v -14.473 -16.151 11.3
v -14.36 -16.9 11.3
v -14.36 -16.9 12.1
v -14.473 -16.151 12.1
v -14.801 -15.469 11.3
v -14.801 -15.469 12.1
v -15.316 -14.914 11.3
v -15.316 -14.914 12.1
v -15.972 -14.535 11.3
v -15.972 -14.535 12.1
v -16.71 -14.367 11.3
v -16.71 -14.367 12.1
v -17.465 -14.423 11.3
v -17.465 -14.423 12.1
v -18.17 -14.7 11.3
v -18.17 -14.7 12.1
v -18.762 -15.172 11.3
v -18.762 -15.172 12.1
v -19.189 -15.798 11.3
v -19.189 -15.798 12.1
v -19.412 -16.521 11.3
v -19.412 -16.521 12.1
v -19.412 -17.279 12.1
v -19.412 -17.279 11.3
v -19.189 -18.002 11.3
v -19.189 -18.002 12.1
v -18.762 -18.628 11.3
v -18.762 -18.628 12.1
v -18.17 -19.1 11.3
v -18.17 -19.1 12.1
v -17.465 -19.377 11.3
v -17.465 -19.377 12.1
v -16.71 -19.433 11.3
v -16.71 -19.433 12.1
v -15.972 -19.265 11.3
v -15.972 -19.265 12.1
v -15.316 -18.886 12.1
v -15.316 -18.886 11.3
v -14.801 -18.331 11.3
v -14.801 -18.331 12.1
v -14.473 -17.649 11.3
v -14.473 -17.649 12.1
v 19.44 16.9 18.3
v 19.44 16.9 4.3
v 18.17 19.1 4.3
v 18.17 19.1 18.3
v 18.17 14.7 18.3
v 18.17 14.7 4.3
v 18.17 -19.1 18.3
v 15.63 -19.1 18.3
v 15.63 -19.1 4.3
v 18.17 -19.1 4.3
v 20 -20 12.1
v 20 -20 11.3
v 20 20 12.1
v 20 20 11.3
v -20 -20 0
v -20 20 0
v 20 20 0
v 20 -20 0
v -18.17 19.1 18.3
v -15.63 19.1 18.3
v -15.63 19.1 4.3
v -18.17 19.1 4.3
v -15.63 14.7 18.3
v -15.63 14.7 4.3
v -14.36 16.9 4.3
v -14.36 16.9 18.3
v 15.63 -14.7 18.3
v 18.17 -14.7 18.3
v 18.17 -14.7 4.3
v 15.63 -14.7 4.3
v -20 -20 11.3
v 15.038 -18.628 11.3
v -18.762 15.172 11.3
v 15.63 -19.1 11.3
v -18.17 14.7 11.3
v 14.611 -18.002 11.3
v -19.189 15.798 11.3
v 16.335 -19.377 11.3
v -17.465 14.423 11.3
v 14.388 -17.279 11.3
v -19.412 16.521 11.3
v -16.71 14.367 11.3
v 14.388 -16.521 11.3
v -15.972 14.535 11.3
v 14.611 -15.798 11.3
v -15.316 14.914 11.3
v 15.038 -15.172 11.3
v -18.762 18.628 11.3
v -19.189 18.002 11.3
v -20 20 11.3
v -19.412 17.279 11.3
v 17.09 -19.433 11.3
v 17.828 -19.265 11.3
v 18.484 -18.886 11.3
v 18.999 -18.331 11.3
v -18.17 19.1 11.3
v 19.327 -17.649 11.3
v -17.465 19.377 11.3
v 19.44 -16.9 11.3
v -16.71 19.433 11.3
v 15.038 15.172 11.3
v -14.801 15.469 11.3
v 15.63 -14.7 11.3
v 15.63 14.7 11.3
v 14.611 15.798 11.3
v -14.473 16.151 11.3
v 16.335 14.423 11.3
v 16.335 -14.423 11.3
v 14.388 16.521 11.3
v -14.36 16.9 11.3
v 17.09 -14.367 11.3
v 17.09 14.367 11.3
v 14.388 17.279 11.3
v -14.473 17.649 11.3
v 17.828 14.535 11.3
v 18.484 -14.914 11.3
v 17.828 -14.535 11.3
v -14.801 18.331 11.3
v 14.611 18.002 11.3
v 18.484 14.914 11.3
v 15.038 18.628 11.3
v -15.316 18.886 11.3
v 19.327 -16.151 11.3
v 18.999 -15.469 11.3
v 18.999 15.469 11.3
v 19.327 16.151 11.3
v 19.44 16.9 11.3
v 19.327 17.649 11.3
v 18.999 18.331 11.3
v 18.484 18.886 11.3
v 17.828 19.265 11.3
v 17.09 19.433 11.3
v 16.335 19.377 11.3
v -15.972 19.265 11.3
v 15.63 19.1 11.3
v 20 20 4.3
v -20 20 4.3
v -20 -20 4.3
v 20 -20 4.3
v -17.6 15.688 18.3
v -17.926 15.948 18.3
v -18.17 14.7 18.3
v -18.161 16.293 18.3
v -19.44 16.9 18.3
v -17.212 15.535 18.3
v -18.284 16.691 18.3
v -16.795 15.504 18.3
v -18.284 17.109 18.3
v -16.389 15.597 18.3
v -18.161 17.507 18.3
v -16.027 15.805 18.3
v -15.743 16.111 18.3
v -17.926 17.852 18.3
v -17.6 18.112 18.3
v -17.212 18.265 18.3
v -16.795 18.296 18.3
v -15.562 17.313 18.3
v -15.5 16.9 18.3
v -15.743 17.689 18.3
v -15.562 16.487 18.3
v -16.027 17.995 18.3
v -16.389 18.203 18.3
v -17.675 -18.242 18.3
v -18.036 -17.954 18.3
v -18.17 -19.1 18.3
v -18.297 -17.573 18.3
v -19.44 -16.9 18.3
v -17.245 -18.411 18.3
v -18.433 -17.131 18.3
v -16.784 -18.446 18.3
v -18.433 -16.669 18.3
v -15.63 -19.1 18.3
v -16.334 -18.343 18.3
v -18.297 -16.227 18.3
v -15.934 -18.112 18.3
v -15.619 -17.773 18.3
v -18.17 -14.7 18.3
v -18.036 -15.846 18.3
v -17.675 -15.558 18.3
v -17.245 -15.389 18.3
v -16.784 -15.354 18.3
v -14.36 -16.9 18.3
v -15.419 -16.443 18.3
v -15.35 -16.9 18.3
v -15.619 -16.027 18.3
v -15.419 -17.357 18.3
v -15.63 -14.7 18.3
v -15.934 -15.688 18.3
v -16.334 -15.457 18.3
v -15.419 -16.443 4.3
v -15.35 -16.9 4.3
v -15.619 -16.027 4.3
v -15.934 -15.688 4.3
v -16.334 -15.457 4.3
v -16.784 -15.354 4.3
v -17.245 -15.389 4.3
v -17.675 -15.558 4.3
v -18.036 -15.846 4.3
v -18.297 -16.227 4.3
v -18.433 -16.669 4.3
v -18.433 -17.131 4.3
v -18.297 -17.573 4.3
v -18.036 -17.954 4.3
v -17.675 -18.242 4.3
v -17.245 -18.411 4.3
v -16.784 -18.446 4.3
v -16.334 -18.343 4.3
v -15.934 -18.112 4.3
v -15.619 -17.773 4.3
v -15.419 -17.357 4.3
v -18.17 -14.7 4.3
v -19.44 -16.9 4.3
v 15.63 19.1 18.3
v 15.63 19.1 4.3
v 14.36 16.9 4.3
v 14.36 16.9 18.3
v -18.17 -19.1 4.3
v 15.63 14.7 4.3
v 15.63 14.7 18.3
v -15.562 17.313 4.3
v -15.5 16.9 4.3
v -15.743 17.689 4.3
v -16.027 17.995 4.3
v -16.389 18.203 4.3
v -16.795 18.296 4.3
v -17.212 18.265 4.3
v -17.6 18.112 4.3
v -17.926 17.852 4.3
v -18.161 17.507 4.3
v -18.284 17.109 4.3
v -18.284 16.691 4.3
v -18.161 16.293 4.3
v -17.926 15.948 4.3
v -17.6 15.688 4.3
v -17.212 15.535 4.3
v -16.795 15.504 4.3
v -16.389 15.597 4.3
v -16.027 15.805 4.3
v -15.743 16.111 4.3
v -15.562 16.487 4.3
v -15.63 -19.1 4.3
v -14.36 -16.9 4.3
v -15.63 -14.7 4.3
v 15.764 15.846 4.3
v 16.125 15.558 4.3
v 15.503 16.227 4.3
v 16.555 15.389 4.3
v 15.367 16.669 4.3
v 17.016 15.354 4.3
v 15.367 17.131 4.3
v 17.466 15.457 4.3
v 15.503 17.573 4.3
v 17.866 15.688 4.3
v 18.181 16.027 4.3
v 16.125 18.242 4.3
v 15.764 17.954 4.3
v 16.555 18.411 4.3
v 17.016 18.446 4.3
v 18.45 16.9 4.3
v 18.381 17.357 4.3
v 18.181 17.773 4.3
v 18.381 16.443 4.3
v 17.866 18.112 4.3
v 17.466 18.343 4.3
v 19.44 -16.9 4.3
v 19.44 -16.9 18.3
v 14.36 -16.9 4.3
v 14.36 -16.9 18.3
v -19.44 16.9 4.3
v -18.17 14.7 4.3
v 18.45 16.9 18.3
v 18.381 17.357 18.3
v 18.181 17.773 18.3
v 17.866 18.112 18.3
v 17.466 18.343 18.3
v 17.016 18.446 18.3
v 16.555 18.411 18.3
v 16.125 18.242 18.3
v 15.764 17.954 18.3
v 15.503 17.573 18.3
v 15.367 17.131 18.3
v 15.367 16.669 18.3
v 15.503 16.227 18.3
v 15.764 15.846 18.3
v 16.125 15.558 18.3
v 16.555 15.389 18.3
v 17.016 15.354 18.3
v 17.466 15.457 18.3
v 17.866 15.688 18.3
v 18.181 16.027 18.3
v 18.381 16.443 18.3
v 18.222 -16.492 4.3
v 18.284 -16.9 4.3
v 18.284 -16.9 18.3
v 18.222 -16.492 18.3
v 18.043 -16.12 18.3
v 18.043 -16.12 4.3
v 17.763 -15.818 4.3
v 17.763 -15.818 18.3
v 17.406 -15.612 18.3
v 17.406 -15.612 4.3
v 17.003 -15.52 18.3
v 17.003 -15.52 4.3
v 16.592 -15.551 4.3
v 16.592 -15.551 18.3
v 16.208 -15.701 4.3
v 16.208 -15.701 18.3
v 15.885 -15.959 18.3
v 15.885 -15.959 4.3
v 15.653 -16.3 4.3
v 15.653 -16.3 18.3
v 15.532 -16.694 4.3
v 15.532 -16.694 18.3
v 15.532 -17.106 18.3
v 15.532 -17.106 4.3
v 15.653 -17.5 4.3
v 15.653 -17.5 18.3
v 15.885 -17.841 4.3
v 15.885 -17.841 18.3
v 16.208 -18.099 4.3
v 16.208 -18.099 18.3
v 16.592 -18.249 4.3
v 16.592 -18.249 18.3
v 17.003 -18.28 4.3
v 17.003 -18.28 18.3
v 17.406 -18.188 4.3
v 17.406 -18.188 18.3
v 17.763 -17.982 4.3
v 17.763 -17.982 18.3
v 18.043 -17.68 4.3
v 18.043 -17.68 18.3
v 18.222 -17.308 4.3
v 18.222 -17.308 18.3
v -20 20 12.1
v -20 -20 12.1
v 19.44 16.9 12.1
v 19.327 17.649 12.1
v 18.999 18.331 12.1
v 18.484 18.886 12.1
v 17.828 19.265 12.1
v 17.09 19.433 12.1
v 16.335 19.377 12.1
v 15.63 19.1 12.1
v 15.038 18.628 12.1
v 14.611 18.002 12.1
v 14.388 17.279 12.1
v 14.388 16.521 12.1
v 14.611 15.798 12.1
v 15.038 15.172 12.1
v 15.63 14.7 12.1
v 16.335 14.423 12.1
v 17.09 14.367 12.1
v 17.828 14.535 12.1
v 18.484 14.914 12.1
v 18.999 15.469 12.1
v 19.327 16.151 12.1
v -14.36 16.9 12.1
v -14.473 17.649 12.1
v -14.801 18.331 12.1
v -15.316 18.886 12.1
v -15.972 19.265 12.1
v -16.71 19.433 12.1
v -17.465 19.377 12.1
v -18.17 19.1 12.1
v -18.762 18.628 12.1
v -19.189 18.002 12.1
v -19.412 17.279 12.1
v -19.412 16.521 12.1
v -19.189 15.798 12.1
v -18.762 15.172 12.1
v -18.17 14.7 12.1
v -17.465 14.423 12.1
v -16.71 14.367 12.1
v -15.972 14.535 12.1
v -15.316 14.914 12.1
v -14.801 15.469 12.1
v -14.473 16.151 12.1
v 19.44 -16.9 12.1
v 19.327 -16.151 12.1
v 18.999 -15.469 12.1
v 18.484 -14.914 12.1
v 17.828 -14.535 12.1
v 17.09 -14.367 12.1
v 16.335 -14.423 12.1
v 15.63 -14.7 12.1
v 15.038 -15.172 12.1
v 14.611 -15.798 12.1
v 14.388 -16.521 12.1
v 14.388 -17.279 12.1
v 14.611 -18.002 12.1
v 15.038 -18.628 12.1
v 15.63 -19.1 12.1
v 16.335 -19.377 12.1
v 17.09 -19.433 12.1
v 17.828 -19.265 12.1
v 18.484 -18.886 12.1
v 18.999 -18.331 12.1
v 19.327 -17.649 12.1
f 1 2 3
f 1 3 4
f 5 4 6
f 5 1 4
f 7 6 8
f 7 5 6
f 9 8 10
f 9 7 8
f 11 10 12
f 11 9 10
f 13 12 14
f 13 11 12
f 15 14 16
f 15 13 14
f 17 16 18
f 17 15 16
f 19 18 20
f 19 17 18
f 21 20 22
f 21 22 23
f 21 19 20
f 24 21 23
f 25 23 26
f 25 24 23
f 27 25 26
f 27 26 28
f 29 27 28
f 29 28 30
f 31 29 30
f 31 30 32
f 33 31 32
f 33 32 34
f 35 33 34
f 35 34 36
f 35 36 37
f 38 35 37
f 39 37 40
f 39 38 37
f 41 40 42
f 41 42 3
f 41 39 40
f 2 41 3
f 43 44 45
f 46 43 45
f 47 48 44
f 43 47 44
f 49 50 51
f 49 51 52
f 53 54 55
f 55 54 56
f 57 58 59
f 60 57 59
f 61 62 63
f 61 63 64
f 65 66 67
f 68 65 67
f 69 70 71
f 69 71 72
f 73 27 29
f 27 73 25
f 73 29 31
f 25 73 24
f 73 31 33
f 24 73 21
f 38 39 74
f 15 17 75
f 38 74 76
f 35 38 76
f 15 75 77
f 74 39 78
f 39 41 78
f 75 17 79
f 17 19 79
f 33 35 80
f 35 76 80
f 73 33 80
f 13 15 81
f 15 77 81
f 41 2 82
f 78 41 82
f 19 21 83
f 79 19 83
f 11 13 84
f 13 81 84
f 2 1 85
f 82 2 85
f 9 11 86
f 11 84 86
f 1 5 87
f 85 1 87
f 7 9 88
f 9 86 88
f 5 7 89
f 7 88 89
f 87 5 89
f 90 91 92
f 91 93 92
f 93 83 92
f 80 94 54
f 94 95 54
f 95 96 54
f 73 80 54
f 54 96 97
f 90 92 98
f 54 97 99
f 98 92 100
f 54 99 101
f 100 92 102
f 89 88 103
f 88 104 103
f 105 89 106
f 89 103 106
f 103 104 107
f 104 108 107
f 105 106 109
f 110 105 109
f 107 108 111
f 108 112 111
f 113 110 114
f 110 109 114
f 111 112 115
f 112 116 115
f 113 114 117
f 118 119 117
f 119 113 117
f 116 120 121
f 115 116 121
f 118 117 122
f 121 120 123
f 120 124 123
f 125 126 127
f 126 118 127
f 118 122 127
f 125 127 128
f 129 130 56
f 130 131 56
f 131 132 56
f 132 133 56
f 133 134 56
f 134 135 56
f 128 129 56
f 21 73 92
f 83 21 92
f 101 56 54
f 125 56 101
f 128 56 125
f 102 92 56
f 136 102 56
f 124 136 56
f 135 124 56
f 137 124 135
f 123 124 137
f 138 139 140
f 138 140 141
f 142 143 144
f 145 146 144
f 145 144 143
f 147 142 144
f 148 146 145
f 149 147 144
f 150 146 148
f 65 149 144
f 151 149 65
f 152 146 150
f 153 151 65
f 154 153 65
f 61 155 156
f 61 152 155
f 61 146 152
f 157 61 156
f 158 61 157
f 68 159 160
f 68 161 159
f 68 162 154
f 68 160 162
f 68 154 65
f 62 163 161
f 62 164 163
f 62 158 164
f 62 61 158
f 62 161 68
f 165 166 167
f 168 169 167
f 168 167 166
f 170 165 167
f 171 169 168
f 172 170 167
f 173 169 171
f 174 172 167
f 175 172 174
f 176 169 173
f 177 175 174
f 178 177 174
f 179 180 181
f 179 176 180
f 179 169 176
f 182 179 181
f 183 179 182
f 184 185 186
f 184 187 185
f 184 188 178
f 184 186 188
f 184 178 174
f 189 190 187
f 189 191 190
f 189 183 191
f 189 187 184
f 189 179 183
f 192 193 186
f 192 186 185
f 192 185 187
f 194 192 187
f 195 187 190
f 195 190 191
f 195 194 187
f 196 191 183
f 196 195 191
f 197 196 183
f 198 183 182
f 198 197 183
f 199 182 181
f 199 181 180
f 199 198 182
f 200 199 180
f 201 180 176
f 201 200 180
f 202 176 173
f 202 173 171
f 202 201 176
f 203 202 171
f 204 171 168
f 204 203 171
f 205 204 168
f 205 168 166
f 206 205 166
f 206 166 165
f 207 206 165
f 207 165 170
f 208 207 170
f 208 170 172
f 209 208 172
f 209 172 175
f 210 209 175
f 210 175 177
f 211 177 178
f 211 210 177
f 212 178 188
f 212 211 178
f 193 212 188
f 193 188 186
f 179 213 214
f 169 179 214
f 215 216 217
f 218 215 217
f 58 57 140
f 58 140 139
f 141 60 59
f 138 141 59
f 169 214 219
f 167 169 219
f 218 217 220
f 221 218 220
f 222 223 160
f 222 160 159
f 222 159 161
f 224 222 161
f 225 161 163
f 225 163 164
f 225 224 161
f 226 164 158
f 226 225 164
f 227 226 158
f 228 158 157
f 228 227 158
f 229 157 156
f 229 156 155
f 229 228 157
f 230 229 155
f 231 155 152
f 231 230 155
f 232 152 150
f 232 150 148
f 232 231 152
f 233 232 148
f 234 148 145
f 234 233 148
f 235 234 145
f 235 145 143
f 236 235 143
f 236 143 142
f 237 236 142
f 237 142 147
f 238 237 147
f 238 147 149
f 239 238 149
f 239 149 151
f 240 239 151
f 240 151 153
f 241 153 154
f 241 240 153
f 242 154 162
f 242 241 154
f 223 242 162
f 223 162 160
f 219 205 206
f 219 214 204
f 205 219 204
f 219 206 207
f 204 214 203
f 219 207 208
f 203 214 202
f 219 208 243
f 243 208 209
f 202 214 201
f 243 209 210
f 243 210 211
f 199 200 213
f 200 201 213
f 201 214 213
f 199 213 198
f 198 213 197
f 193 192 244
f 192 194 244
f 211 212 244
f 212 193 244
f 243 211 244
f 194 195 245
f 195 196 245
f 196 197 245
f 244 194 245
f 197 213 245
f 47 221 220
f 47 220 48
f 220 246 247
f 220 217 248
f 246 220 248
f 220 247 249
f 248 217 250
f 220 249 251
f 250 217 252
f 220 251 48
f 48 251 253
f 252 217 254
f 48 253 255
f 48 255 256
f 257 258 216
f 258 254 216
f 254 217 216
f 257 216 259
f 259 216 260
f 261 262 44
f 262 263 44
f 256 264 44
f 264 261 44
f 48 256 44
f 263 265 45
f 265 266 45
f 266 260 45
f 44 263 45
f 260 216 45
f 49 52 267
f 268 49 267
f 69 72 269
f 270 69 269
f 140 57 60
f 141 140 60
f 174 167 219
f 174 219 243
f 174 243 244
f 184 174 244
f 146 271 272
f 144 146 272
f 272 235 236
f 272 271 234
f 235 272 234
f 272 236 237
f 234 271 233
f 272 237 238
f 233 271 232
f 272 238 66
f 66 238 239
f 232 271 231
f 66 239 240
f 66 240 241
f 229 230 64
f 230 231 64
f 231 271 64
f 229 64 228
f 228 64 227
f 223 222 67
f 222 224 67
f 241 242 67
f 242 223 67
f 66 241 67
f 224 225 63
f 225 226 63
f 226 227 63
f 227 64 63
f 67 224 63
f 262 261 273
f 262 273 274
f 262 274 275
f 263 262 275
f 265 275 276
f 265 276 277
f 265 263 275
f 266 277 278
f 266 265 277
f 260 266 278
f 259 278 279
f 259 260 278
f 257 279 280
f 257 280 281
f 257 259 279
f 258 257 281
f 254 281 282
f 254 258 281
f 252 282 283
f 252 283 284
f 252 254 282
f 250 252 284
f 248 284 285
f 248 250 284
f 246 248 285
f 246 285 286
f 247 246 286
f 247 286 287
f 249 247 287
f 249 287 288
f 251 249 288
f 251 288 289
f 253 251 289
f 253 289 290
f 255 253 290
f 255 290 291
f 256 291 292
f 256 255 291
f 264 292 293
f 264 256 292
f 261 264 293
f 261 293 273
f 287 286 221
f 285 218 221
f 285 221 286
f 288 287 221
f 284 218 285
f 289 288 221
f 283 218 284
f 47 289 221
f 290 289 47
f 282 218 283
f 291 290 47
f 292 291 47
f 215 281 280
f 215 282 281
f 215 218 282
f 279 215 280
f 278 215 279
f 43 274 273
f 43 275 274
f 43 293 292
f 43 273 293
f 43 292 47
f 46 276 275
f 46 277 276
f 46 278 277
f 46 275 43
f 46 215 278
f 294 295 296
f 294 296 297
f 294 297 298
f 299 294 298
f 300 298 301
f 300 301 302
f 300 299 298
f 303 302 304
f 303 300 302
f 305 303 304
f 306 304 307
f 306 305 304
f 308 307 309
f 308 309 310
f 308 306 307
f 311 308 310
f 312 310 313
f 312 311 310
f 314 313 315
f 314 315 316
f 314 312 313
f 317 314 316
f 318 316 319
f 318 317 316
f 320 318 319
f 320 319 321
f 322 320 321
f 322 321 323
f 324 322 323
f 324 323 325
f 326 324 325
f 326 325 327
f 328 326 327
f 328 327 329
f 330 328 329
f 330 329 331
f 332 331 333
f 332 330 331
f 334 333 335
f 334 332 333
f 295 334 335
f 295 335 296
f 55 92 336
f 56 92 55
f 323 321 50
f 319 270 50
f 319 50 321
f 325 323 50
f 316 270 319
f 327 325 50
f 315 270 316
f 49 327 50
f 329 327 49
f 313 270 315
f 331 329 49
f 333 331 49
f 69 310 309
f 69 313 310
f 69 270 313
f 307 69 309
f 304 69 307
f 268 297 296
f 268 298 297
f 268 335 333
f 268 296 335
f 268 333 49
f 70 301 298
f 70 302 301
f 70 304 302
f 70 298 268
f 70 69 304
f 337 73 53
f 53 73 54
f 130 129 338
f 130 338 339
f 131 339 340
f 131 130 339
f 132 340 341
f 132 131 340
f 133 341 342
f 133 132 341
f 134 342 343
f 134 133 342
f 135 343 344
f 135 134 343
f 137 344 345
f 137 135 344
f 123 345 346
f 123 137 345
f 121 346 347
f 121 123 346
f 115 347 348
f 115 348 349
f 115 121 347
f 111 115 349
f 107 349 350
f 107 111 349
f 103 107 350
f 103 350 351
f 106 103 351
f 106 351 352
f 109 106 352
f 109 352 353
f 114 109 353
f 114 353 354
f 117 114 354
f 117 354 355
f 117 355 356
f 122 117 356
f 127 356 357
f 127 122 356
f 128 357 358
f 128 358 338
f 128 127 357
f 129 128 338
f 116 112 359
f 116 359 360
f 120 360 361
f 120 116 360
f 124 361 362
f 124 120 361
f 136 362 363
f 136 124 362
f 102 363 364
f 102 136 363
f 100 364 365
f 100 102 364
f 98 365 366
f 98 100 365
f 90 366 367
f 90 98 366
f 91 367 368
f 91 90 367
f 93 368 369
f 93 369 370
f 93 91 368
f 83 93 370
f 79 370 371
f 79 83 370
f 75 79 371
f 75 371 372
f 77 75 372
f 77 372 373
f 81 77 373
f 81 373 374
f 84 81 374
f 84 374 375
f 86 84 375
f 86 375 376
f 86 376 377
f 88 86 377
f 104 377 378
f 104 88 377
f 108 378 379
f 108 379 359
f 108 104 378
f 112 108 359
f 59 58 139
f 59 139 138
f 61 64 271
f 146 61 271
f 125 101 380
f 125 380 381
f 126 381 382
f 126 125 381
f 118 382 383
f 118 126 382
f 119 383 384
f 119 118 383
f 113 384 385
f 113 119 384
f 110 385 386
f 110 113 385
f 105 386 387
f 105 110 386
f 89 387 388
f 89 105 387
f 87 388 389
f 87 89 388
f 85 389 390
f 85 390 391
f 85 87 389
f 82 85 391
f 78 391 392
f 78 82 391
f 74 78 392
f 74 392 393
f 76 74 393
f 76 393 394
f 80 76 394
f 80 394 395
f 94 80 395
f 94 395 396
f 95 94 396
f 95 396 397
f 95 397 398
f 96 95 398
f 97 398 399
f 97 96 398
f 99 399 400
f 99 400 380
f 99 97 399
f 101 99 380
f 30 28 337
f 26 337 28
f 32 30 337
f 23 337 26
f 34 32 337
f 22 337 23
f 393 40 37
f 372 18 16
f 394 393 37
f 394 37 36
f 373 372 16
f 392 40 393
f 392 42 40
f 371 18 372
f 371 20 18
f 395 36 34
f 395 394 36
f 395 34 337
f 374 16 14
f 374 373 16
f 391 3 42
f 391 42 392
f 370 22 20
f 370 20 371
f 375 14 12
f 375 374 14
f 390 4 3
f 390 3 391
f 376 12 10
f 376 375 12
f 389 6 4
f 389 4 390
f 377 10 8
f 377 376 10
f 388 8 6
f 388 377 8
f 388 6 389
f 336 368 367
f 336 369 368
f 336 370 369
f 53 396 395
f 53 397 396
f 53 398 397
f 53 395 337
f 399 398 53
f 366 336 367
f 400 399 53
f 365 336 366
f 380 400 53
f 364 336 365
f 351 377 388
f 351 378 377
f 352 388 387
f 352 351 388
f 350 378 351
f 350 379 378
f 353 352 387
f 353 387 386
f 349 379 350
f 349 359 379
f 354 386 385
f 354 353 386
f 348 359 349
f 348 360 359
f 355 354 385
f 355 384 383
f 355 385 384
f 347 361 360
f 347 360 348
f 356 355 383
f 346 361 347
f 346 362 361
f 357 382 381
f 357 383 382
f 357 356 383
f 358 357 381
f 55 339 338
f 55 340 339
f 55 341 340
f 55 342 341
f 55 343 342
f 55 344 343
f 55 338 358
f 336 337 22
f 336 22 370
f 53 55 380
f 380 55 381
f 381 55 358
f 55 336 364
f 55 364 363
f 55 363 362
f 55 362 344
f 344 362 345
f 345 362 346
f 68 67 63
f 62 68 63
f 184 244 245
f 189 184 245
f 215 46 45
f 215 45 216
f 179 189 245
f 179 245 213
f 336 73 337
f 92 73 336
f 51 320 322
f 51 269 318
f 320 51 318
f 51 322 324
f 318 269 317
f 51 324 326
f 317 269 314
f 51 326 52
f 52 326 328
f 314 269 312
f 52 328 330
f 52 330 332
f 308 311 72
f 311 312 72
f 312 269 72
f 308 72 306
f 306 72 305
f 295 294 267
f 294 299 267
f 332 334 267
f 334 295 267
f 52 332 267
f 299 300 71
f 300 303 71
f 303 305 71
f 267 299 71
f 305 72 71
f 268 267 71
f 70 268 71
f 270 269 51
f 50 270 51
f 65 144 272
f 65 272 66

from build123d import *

# Parameters (mm, degrees)
SKETCH1_W             = 40
SKETCH1_H             = 40
BOSS_EXTRUDE1_DEPTH   = 4.3
SKETCH2_R             = 1.4
BOSS_EXTRUDE2_DEPTH   = 14
SKETCH2_R_2           = 1.55
BOSS_EXTRUDE2_2_DEPTH = 14
BOSS_EXTRUDE2_3_DEPTH = 14
SKETCH2_R_3           = 1.383952534
BOSS_EXTRUDE2_4_DEPTH = 14
SKETCH4_W             = 40
SKETCH4_H             = 40
SKETCH4_R             = 2.540341184
BOSS_EXTRUDE3_DEPTH   = 0.8


with BuildPart() as part:
    # Sketch1 → Boss-Extrude1 (new body)
    with BuildSketch(Plane.XY):
        Rectangle(SKETCH1_W, SKETCH1_H)
    extrude(amount=BOSS_EXTRUDE1_DEPTH)


with BuildPart() as body_2:
    # Sketch2 → Boss-Extrude2 (new body)
    with BuildSketch(Plane.XY.offset(4.3)):
        Polygon((-14.359658816, 16.9), (-15.629829408, 19.1), (-18.170170592, 19.1), (-19.440341184, 16.9), (-18.170170592, 14.7), (-15.629829408, 14.7), align=None)
        with Locations((-16.9, 16.9)):
            Circle(SKETCH2_R, mode=Mode.SUBTRACT)
    extrude(amount=BOSS_EXTRUDE2_DEPTH)


with BuildPart() as body_3:
    # Sketch2 → Boss-Extrude2 2 (new body)
    with BuildSketch(Plane.XY.offset(4.3)):
        Polygon((14.359658816, 16.9), (15.629829408, 14.7), (18.170170592, 14.7), (19.440341184, 16.9), (18.170170592, 19.1), (15.629829408, 19.1), align=None)
        with Locations((16.9, 16.9)):
            Circle(SKETCH2_R_2, mode=Mode.SUBTRACT)
    extrude(amount=BOSS_EXTRUDE2_2_DEPTH)


with BuildPart() as body_4:
    # Sketch2 → Boss-Extrude2 3 (new body)
    with BuildSketch(Plane.XY.offset(4.3)):
        Polygon((-14.359658816, -16.9), (-15.629829408, -14.7), (-18.170170592, -14.7), (-19.440341184, -16.9), (-18.170170592, -19.1), (-15.629829408, -19.1), align=None)
        with Locations((-16.9, -16.9)):
            Circle(SKETCH2_R_2, mode=Mode.SUBTRACT)
    extrude(amount=BOSS_EXTRUDE2_3_DEPTH)


with BuildPart() as body_5:
    # Sketch2 → Boss-Extrude2 4 (new body)
    with BuildSketch(Plane.XY.offset(4.3)):
        Polygon((19.440341184, -16.9), (18.170170592, -14.7), (15.629829408, -14.7), (14.359658816, -16.9), (15.629829408, -19.1), (18.170170592, -19.1), align=None)
        with Locations((16.9, -16.9)):
            Circle(SKETCH2_R_3, mode=Mode.SUBTRACT)
    extrude(amount=BOSS_EXTRUDE2_4_DEPTH)


with BuildPart() as body_6:
    # Sketch4 → Boss-Extrude3 (new body)
    with BuildSketch(Plane.XY.offset(11.3)):
        Rectangle(SKETCH4_W, SKETCH4_H)
        with Locations((-16.9, 16.9)):
            Circle(SKETCH4_R, mode=Mode.SUBTRACT)
        with Locations((16.9, 16.9)):
            Circle(SKETCH4_R, mode=Mode.SUBTRACT)
        with Locations((16.9, -16.9)):
            Circle(SKETCH4_R, mode=Mode.SUBTRACT)
        with Locations((-16.9, -16.9)):
            Circle(SKETCH4_R, mode=Mode.SUBTRACT)
    extrude(amount=BOSS_EXTRUDE3_DEPTH)


solid = Compound([part.part, body_2.part, body_3.part, body_4.part, body_5.part, body_6.part])
